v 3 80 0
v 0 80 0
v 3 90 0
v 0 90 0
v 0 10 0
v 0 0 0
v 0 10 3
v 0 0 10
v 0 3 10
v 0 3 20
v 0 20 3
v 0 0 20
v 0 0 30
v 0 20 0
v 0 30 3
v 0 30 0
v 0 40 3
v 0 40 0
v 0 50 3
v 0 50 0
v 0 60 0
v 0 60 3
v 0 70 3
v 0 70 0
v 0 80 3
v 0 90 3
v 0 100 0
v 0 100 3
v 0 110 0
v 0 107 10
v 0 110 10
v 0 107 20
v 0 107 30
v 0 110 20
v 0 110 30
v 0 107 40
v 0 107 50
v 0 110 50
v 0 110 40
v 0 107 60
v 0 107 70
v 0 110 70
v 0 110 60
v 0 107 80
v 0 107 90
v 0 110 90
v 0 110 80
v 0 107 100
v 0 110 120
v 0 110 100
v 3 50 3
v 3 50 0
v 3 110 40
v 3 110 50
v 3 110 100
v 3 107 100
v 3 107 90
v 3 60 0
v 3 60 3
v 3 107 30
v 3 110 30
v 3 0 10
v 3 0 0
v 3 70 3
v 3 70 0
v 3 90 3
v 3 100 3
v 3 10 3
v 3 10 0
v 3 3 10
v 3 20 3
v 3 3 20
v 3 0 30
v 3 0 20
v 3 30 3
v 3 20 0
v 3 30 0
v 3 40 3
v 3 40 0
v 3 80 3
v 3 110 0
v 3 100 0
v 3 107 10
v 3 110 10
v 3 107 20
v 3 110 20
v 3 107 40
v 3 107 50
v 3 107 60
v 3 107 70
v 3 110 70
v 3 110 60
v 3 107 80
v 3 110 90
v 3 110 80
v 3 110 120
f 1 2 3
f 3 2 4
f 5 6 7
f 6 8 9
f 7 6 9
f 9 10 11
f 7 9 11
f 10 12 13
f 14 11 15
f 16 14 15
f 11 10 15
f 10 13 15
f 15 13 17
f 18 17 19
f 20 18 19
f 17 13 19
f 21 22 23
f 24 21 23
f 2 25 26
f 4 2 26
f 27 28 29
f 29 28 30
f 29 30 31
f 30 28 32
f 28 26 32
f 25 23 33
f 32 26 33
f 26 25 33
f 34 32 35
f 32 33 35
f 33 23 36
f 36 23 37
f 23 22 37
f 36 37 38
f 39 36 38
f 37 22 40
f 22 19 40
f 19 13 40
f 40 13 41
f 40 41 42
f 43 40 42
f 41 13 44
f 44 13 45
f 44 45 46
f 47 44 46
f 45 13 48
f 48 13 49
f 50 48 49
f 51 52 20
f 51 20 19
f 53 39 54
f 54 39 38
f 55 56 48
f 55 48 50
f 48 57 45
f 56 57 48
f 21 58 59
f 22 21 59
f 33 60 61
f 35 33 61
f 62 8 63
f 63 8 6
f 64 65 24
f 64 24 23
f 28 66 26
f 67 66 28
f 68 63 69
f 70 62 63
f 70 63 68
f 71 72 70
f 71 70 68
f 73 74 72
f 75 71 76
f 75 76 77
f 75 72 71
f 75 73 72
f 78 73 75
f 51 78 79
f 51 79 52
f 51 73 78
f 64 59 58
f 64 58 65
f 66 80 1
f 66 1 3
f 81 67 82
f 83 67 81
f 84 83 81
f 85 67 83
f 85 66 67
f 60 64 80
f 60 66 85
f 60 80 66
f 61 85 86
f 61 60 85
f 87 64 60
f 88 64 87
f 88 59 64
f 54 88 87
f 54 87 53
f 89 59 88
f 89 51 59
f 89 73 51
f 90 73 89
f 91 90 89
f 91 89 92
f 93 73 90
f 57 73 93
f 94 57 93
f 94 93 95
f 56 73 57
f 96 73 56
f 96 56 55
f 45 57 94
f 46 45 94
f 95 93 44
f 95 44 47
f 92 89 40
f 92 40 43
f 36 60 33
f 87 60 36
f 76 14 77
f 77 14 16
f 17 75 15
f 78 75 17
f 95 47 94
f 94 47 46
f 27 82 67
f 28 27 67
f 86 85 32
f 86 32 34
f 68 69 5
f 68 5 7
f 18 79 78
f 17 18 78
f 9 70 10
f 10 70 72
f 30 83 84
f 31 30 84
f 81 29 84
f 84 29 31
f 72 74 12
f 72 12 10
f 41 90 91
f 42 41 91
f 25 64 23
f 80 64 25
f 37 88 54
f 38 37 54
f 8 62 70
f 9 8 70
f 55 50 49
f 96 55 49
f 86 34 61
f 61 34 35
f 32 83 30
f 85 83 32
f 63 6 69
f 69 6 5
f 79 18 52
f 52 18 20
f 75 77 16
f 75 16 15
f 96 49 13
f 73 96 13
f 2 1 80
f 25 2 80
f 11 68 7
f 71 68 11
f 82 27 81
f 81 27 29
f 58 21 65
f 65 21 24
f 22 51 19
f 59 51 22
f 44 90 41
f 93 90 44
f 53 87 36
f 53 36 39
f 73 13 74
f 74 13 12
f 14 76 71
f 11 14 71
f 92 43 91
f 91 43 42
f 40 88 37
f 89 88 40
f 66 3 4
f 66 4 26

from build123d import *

# Parameters (mm, degrees)
F1_DEPTH = 3
F2_W     = 10
F2_H     = 3
F3_DEPTH = 25
F4_W     = 3
F4_H     = 10
F5_DEPTH = 25
F6_W     = 3
F6_H     = 10
F7_DEPTH = 25


with BuildPart() as f1:
    # F0 (on Right) → F1 (new body)
    with BuildSketch(Plane.YZ):
        Polygon((0, 0), (110, 0), (110, 120), (0, 30), align=None)
    extrude(amount=F1_DEPTH)

    # F2 (on face) → F3 (cut)
    with BuildSketch(Plane.YZ.offset(3)):
        with Locations((15, 1.5)):
            Rectangle(F2_W, F2_H)
        with Locations((35, 1.5)):
            Rectangle(F2_W, F2_H)
        with Locations((55, 1.5)):
            Rectangle(F2_W, F2_H)
        with Locations((75, 1.5)):
            Rectangle(F2_W, F2_H)
        with Locations((95, 1.5)):
            Rectangle(F2_W, F2_H)
    extrude(amount=-F3_DEPTH, mode=Mode.SUBTRACT)

    # F4 (on face) → F5 (cut)
    with BuildSketch(Plane.YZ.offset(3)):
        with Locations((1.5, 15)):
            Rectangle(F4_W, F4_H)
    extrude(amount=-F5_DEPTH, mode=Mode.SUBTRACT)

    # F6 (on face) → F7 (cut)
    with BuildSketch(Plane.YZ.offset(3)):
        with Locations((108.5, 15)):
            Rectangle(F6_W, F6_H)
        with Locations((108.5, 35)):
            Rectangle(F6_W, F6_H)
        with Locations((108.5, 55)):
            Rectangle(F6_W, F6_H)
        with Locations((108.5, 75)):
            Rectangle(F6_W, F6_H)
        with Locations((108.5, 95)):
            Rectangle(F6_W, F6_H)
    extrude(amount=-F7_DEPTH, mode=Mode.SUBTRACT)


solid = f1.part
